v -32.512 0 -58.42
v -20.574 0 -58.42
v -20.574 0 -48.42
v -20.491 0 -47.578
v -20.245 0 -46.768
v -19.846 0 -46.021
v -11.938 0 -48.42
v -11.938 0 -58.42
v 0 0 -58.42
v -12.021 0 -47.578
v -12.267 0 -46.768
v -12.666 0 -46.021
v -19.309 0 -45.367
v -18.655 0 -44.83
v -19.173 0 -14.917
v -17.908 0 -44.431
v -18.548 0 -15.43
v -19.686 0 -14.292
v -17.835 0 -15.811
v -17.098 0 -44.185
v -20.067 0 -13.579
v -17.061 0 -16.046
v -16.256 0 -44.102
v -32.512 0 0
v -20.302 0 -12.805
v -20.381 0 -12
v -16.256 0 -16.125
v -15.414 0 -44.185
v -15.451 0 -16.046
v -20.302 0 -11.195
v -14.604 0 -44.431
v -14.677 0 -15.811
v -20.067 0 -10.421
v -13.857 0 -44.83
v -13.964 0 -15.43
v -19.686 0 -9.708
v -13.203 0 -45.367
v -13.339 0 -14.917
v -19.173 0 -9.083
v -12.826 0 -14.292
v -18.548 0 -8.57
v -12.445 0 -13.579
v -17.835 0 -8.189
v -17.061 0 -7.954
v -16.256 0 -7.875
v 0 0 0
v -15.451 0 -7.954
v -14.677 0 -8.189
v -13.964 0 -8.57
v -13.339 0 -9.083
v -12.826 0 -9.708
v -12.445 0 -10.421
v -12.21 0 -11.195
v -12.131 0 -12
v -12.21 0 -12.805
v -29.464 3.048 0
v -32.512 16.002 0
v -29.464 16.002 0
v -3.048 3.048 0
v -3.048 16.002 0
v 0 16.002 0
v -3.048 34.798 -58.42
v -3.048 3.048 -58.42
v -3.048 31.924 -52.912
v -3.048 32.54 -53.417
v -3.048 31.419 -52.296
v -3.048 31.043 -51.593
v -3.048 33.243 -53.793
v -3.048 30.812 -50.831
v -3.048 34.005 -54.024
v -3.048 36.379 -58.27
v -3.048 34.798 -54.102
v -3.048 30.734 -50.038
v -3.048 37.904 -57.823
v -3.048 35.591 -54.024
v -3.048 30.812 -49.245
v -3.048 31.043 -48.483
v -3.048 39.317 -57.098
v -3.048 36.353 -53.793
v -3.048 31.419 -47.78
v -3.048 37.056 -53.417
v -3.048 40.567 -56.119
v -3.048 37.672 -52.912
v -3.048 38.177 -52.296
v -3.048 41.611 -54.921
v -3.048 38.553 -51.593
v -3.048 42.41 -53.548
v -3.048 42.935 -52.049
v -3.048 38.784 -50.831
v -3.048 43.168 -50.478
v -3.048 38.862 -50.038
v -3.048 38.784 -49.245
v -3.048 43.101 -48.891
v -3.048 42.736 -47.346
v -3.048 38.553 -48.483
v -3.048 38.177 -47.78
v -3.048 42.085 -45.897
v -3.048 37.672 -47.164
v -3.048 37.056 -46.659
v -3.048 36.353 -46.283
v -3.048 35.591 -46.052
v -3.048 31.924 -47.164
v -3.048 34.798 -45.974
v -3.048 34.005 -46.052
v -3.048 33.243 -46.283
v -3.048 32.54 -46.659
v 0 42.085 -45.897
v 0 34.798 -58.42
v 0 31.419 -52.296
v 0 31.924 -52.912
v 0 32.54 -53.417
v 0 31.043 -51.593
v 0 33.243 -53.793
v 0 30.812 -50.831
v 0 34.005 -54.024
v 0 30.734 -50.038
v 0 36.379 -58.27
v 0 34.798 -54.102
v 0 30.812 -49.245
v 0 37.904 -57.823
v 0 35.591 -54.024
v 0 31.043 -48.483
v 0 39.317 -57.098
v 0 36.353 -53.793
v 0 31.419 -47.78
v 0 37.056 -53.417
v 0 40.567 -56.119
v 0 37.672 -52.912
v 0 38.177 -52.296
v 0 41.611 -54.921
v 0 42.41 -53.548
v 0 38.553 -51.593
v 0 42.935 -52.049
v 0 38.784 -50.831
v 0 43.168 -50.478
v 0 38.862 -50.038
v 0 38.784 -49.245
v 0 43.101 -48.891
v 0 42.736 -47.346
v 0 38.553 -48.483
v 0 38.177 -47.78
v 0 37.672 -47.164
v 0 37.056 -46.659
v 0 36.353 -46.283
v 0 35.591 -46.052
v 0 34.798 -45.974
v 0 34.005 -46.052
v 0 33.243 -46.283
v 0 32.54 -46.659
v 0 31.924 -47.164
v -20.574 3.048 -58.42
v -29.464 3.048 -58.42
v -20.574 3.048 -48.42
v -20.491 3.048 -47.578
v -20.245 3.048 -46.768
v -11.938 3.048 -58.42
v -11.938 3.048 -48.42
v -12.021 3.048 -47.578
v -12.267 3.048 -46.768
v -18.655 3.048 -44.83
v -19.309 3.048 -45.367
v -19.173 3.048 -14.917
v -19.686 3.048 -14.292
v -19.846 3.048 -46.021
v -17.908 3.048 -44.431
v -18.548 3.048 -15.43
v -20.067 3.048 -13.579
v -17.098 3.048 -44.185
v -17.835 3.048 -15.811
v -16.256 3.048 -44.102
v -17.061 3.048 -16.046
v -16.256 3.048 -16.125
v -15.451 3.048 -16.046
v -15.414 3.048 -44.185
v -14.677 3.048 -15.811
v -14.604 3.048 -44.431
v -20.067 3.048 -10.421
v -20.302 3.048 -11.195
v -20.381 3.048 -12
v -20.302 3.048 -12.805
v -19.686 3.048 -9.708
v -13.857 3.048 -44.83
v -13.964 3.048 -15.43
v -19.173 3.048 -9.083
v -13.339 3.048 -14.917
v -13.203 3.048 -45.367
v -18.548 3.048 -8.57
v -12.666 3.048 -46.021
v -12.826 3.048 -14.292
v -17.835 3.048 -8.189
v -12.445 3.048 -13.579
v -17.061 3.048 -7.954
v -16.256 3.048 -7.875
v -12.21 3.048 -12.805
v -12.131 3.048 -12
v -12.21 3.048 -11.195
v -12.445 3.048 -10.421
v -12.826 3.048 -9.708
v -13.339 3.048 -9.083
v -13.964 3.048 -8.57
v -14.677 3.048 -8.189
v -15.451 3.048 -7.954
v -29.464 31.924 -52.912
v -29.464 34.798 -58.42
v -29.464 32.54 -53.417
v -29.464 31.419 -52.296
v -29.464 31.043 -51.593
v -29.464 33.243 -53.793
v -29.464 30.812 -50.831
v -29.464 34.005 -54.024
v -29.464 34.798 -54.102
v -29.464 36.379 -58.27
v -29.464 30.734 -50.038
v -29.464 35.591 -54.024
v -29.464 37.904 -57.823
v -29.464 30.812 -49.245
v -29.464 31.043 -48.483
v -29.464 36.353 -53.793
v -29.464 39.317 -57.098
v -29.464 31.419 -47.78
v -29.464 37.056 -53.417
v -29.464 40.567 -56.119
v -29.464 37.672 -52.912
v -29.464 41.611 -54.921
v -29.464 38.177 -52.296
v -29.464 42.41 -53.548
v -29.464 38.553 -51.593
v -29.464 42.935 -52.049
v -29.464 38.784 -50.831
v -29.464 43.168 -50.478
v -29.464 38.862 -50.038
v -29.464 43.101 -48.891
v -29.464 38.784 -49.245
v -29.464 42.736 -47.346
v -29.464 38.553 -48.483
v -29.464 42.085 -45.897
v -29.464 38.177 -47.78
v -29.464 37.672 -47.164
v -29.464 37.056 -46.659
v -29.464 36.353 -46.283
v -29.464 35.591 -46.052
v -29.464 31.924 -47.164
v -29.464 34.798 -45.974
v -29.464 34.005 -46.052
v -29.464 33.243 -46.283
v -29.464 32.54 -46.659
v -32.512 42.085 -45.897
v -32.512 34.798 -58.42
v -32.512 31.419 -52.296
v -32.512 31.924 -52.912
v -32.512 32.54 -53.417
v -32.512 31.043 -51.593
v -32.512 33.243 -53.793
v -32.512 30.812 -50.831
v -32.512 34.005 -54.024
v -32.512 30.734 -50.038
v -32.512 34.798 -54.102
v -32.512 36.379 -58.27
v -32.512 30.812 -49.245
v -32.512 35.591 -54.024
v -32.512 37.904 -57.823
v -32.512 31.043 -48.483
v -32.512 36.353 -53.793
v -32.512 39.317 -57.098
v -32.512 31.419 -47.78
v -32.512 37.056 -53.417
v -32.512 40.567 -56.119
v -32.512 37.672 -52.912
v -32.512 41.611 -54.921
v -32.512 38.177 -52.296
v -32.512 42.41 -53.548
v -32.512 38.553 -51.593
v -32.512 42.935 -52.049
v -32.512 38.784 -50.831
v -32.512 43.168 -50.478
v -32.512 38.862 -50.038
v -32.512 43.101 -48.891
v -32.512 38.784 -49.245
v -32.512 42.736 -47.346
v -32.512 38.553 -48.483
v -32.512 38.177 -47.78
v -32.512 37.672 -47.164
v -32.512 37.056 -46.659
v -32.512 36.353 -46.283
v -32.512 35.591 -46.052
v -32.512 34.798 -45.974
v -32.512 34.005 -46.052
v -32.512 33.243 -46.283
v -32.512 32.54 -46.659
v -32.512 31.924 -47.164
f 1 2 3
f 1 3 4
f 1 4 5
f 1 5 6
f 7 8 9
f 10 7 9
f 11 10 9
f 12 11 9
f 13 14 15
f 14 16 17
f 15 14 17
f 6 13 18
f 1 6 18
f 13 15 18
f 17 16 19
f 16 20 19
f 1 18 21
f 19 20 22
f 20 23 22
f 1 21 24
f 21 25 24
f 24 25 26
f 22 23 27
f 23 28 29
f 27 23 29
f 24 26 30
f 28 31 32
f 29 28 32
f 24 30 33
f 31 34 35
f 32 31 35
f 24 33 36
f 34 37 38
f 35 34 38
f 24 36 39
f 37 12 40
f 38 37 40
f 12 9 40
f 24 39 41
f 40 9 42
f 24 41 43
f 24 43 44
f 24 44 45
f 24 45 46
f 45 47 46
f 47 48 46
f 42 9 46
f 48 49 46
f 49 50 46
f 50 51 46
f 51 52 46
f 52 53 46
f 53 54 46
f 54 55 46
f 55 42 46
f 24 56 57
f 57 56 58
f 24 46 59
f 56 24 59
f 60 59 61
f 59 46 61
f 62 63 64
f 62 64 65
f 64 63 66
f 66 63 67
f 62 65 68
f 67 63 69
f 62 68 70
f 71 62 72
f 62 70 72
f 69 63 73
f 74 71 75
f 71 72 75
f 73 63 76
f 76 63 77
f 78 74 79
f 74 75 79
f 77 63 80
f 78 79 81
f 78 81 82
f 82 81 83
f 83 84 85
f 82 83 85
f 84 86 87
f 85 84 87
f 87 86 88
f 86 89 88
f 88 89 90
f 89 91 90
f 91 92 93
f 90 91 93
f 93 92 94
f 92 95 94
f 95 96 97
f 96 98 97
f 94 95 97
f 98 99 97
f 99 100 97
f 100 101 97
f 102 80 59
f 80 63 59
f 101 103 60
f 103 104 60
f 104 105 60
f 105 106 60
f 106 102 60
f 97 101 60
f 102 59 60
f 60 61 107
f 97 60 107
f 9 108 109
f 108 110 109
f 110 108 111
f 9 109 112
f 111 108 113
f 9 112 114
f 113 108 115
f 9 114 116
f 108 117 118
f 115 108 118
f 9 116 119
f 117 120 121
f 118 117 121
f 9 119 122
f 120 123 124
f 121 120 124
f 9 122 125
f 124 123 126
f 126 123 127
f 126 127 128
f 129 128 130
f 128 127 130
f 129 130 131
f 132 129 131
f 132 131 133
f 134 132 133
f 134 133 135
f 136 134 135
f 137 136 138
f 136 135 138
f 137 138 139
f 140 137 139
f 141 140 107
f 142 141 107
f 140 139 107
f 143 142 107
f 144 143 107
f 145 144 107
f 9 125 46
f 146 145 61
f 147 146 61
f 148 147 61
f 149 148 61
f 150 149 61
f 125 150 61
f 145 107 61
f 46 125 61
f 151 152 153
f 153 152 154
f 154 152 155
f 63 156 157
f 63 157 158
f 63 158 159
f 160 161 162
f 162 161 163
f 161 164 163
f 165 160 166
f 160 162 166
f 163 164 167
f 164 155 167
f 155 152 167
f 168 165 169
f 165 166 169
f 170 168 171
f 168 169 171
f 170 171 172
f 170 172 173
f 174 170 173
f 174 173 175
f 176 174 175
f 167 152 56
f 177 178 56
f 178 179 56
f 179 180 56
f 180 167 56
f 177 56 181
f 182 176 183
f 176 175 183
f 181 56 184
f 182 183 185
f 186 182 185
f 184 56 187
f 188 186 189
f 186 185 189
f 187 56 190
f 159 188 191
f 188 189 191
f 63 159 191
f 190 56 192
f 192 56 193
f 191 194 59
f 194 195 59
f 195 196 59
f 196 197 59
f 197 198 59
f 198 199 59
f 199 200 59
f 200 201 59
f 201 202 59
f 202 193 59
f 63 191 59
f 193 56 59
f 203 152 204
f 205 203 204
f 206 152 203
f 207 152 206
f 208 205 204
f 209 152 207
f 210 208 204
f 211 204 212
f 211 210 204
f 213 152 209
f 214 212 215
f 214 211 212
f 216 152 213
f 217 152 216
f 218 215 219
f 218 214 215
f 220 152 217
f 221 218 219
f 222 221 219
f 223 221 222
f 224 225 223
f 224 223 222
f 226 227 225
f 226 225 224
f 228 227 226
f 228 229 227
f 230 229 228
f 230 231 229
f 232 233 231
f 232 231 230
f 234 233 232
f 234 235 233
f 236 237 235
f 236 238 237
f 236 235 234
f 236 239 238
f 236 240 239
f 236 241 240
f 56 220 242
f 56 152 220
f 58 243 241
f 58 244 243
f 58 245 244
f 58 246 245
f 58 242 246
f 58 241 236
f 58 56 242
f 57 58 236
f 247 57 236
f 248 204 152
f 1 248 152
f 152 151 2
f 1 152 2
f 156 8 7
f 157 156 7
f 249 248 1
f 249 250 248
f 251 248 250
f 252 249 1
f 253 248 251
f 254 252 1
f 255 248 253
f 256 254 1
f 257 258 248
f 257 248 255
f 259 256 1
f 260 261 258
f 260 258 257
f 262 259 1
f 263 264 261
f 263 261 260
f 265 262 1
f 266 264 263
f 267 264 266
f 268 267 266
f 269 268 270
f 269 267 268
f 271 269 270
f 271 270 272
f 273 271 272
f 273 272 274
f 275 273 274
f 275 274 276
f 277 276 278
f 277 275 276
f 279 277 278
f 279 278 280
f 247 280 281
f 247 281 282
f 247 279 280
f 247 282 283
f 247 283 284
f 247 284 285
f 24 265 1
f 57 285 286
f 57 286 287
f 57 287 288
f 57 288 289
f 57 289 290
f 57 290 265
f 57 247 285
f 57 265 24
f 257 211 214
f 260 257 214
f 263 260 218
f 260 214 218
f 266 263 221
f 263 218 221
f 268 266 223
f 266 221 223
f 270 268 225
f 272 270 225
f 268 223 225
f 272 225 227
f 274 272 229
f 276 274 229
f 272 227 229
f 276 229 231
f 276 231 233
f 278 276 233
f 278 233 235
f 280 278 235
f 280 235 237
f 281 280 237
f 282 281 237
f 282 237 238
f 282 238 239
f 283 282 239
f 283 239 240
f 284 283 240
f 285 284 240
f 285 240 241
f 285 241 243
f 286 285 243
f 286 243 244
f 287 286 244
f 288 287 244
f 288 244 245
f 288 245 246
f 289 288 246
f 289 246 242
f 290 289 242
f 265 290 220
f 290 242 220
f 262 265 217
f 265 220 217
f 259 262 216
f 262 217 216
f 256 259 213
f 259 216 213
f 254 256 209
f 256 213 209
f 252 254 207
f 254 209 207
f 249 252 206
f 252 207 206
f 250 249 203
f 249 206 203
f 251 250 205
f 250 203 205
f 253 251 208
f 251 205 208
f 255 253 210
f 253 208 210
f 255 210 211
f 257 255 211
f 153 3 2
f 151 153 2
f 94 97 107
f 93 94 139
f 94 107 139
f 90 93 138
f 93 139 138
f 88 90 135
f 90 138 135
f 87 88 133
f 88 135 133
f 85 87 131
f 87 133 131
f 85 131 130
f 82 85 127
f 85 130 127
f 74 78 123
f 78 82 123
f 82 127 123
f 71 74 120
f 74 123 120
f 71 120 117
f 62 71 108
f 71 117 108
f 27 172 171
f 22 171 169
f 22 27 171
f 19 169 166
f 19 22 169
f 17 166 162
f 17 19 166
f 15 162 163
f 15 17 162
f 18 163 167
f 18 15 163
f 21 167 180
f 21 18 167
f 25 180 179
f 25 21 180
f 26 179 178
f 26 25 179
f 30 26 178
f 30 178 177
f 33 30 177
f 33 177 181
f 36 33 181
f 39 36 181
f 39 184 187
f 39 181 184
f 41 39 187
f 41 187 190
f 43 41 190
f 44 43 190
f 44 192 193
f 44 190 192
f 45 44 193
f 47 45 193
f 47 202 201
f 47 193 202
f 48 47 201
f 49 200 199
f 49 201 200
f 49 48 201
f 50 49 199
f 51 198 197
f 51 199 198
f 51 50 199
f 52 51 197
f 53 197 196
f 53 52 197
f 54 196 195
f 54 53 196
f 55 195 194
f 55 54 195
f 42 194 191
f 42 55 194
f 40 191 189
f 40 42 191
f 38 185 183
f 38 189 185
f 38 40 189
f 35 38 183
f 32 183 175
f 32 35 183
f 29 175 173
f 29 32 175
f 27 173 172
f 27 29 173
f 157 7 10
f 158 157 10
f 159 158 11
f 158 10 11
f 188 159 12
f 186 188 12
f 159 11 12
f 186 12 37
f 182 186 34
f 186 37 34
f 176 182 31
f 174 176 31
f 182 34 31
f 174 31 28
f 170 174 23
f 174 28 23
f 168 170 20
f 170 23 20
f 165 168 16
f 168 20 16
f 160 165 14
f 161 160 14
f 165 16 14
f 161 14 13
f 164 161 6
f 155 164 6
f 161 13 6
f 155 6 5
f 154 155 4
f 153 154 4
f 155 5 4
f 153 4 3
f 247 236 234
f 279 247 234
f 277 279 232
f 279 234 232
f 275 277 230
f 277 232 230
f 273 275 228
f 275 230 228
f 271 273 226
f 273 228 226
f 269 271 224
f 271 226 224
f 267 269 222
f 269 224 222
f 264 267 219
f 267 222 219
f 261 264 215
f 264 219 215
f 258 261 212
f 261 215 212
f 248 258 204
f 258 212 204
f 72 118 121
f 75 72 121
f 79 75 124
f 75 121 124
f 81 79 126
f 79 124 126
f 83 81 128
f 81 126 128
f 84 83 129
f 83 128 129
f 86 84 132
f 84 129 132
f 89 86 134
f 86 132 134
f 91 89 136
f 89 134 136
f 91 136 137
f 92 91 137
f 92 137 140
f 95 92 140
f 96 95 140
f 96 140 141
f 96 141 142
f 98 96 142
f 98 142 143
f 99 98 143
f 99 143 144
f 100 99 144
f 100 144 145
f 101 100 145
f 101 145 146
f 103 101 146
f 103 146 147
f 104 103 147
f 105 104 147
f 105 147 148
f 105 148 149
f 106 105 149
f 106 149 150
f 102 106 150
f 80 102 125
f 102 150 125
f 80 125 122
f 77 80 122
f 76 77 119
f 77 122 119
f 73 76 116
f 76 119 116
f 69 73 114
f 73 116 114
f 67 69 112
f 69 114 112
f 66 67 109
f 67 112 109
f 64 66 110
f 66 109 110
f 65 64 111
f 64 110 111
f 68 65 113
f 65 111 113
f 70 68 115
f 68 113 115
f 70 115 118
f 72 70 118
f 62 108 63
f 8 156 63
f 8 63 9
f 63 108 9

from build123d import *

# Parameters (mm, degrees)
SKETCH1_R               = 4.064
BOSS_EXTRUDE1_DEPTH     = 32.512
SKETCH2_W               = 26.416
SKETCH2_H               = 40.132
CUT_EXTRUDE1_DEPTH      = 59.42
SKETCH3_R               = 4.125
CUT_EXTRUDE3_DEPTH      = 44.18
CUT_EXTRUDE3_DEPTH_BACK = 35.052


with BuildPart() as part:
    # Sketch1 → Boss-Extrude1 (new body)
    with BuildSketch(Plane(origin=(0, 0, 0), x_dir=(0, 0, -1), z_dir=(1, 0, 0))):
        with BuildLine():
            Line((0, 16.002), (45.896514256, 42.085387724))
            ThreePointArc((45.896514256, 42.085387724), (54.253684434, 42.0427173), (58.42, 34.798))
            Line((58.42, 34.798), (58.42, 0))
            Line((58.42, 0), (0, 0))
            Line((0, 0), (0, 16.002))
        make_face()
        with Locations((50.038, 34.798)):
            Circle(SKETCH1_R, mode=Mode.SUBTRACT)
    extrude(amount=-BOSS_EXTRUDE1_DEPTH)

    # Sketch2 → Cut-Extrude1 (cut, through all)
    with BuildSketch(Plane.XY):
        with Locations((-16.256, 23.114)):
            Rectangle(SKETCH2_W, SKETCH2_H)
    extrude(amount=-CUT_EXTRUDE1_DEPTH, mode=Mode.SUBTRACT)

    # Sketch3 → Cut-Extrude3 (cut, two sides)
    with BuildSketch(Plane(origin=(0, 0, 0), x_dir=(1, 0, 0), z_dir=(0, 1, 0))) as cut_extrude3_sk:
        with Locations(Location((-16.256, 12, 0), (0, 0, 90))):  # turned: the seam where the file's is
            Circle(SKETCH3_R)
        with BuildLine():
            Line((-20.574, 48.42), (-20.574, 58.42))
            Line((-20.574, 58.42), (-11.938, 58.42))
            Line((-11.938, 58.42), (-11.938, 48.42))
            ThreePointArc((-11.938, 48.42), (-16.256, 44.102), (-20.574, 48.42))
        make_face()
    extrude(amount=CUT_EXTRUDE3_DEPTH, mode=Mode.SUBTRACT)
    extrude(cut_extrude3_sk.sketch, amount=-CUT_EXTRUDE3_DEPTH_BACK, mode=Mode.SUBTRACT)


solid = part.part
